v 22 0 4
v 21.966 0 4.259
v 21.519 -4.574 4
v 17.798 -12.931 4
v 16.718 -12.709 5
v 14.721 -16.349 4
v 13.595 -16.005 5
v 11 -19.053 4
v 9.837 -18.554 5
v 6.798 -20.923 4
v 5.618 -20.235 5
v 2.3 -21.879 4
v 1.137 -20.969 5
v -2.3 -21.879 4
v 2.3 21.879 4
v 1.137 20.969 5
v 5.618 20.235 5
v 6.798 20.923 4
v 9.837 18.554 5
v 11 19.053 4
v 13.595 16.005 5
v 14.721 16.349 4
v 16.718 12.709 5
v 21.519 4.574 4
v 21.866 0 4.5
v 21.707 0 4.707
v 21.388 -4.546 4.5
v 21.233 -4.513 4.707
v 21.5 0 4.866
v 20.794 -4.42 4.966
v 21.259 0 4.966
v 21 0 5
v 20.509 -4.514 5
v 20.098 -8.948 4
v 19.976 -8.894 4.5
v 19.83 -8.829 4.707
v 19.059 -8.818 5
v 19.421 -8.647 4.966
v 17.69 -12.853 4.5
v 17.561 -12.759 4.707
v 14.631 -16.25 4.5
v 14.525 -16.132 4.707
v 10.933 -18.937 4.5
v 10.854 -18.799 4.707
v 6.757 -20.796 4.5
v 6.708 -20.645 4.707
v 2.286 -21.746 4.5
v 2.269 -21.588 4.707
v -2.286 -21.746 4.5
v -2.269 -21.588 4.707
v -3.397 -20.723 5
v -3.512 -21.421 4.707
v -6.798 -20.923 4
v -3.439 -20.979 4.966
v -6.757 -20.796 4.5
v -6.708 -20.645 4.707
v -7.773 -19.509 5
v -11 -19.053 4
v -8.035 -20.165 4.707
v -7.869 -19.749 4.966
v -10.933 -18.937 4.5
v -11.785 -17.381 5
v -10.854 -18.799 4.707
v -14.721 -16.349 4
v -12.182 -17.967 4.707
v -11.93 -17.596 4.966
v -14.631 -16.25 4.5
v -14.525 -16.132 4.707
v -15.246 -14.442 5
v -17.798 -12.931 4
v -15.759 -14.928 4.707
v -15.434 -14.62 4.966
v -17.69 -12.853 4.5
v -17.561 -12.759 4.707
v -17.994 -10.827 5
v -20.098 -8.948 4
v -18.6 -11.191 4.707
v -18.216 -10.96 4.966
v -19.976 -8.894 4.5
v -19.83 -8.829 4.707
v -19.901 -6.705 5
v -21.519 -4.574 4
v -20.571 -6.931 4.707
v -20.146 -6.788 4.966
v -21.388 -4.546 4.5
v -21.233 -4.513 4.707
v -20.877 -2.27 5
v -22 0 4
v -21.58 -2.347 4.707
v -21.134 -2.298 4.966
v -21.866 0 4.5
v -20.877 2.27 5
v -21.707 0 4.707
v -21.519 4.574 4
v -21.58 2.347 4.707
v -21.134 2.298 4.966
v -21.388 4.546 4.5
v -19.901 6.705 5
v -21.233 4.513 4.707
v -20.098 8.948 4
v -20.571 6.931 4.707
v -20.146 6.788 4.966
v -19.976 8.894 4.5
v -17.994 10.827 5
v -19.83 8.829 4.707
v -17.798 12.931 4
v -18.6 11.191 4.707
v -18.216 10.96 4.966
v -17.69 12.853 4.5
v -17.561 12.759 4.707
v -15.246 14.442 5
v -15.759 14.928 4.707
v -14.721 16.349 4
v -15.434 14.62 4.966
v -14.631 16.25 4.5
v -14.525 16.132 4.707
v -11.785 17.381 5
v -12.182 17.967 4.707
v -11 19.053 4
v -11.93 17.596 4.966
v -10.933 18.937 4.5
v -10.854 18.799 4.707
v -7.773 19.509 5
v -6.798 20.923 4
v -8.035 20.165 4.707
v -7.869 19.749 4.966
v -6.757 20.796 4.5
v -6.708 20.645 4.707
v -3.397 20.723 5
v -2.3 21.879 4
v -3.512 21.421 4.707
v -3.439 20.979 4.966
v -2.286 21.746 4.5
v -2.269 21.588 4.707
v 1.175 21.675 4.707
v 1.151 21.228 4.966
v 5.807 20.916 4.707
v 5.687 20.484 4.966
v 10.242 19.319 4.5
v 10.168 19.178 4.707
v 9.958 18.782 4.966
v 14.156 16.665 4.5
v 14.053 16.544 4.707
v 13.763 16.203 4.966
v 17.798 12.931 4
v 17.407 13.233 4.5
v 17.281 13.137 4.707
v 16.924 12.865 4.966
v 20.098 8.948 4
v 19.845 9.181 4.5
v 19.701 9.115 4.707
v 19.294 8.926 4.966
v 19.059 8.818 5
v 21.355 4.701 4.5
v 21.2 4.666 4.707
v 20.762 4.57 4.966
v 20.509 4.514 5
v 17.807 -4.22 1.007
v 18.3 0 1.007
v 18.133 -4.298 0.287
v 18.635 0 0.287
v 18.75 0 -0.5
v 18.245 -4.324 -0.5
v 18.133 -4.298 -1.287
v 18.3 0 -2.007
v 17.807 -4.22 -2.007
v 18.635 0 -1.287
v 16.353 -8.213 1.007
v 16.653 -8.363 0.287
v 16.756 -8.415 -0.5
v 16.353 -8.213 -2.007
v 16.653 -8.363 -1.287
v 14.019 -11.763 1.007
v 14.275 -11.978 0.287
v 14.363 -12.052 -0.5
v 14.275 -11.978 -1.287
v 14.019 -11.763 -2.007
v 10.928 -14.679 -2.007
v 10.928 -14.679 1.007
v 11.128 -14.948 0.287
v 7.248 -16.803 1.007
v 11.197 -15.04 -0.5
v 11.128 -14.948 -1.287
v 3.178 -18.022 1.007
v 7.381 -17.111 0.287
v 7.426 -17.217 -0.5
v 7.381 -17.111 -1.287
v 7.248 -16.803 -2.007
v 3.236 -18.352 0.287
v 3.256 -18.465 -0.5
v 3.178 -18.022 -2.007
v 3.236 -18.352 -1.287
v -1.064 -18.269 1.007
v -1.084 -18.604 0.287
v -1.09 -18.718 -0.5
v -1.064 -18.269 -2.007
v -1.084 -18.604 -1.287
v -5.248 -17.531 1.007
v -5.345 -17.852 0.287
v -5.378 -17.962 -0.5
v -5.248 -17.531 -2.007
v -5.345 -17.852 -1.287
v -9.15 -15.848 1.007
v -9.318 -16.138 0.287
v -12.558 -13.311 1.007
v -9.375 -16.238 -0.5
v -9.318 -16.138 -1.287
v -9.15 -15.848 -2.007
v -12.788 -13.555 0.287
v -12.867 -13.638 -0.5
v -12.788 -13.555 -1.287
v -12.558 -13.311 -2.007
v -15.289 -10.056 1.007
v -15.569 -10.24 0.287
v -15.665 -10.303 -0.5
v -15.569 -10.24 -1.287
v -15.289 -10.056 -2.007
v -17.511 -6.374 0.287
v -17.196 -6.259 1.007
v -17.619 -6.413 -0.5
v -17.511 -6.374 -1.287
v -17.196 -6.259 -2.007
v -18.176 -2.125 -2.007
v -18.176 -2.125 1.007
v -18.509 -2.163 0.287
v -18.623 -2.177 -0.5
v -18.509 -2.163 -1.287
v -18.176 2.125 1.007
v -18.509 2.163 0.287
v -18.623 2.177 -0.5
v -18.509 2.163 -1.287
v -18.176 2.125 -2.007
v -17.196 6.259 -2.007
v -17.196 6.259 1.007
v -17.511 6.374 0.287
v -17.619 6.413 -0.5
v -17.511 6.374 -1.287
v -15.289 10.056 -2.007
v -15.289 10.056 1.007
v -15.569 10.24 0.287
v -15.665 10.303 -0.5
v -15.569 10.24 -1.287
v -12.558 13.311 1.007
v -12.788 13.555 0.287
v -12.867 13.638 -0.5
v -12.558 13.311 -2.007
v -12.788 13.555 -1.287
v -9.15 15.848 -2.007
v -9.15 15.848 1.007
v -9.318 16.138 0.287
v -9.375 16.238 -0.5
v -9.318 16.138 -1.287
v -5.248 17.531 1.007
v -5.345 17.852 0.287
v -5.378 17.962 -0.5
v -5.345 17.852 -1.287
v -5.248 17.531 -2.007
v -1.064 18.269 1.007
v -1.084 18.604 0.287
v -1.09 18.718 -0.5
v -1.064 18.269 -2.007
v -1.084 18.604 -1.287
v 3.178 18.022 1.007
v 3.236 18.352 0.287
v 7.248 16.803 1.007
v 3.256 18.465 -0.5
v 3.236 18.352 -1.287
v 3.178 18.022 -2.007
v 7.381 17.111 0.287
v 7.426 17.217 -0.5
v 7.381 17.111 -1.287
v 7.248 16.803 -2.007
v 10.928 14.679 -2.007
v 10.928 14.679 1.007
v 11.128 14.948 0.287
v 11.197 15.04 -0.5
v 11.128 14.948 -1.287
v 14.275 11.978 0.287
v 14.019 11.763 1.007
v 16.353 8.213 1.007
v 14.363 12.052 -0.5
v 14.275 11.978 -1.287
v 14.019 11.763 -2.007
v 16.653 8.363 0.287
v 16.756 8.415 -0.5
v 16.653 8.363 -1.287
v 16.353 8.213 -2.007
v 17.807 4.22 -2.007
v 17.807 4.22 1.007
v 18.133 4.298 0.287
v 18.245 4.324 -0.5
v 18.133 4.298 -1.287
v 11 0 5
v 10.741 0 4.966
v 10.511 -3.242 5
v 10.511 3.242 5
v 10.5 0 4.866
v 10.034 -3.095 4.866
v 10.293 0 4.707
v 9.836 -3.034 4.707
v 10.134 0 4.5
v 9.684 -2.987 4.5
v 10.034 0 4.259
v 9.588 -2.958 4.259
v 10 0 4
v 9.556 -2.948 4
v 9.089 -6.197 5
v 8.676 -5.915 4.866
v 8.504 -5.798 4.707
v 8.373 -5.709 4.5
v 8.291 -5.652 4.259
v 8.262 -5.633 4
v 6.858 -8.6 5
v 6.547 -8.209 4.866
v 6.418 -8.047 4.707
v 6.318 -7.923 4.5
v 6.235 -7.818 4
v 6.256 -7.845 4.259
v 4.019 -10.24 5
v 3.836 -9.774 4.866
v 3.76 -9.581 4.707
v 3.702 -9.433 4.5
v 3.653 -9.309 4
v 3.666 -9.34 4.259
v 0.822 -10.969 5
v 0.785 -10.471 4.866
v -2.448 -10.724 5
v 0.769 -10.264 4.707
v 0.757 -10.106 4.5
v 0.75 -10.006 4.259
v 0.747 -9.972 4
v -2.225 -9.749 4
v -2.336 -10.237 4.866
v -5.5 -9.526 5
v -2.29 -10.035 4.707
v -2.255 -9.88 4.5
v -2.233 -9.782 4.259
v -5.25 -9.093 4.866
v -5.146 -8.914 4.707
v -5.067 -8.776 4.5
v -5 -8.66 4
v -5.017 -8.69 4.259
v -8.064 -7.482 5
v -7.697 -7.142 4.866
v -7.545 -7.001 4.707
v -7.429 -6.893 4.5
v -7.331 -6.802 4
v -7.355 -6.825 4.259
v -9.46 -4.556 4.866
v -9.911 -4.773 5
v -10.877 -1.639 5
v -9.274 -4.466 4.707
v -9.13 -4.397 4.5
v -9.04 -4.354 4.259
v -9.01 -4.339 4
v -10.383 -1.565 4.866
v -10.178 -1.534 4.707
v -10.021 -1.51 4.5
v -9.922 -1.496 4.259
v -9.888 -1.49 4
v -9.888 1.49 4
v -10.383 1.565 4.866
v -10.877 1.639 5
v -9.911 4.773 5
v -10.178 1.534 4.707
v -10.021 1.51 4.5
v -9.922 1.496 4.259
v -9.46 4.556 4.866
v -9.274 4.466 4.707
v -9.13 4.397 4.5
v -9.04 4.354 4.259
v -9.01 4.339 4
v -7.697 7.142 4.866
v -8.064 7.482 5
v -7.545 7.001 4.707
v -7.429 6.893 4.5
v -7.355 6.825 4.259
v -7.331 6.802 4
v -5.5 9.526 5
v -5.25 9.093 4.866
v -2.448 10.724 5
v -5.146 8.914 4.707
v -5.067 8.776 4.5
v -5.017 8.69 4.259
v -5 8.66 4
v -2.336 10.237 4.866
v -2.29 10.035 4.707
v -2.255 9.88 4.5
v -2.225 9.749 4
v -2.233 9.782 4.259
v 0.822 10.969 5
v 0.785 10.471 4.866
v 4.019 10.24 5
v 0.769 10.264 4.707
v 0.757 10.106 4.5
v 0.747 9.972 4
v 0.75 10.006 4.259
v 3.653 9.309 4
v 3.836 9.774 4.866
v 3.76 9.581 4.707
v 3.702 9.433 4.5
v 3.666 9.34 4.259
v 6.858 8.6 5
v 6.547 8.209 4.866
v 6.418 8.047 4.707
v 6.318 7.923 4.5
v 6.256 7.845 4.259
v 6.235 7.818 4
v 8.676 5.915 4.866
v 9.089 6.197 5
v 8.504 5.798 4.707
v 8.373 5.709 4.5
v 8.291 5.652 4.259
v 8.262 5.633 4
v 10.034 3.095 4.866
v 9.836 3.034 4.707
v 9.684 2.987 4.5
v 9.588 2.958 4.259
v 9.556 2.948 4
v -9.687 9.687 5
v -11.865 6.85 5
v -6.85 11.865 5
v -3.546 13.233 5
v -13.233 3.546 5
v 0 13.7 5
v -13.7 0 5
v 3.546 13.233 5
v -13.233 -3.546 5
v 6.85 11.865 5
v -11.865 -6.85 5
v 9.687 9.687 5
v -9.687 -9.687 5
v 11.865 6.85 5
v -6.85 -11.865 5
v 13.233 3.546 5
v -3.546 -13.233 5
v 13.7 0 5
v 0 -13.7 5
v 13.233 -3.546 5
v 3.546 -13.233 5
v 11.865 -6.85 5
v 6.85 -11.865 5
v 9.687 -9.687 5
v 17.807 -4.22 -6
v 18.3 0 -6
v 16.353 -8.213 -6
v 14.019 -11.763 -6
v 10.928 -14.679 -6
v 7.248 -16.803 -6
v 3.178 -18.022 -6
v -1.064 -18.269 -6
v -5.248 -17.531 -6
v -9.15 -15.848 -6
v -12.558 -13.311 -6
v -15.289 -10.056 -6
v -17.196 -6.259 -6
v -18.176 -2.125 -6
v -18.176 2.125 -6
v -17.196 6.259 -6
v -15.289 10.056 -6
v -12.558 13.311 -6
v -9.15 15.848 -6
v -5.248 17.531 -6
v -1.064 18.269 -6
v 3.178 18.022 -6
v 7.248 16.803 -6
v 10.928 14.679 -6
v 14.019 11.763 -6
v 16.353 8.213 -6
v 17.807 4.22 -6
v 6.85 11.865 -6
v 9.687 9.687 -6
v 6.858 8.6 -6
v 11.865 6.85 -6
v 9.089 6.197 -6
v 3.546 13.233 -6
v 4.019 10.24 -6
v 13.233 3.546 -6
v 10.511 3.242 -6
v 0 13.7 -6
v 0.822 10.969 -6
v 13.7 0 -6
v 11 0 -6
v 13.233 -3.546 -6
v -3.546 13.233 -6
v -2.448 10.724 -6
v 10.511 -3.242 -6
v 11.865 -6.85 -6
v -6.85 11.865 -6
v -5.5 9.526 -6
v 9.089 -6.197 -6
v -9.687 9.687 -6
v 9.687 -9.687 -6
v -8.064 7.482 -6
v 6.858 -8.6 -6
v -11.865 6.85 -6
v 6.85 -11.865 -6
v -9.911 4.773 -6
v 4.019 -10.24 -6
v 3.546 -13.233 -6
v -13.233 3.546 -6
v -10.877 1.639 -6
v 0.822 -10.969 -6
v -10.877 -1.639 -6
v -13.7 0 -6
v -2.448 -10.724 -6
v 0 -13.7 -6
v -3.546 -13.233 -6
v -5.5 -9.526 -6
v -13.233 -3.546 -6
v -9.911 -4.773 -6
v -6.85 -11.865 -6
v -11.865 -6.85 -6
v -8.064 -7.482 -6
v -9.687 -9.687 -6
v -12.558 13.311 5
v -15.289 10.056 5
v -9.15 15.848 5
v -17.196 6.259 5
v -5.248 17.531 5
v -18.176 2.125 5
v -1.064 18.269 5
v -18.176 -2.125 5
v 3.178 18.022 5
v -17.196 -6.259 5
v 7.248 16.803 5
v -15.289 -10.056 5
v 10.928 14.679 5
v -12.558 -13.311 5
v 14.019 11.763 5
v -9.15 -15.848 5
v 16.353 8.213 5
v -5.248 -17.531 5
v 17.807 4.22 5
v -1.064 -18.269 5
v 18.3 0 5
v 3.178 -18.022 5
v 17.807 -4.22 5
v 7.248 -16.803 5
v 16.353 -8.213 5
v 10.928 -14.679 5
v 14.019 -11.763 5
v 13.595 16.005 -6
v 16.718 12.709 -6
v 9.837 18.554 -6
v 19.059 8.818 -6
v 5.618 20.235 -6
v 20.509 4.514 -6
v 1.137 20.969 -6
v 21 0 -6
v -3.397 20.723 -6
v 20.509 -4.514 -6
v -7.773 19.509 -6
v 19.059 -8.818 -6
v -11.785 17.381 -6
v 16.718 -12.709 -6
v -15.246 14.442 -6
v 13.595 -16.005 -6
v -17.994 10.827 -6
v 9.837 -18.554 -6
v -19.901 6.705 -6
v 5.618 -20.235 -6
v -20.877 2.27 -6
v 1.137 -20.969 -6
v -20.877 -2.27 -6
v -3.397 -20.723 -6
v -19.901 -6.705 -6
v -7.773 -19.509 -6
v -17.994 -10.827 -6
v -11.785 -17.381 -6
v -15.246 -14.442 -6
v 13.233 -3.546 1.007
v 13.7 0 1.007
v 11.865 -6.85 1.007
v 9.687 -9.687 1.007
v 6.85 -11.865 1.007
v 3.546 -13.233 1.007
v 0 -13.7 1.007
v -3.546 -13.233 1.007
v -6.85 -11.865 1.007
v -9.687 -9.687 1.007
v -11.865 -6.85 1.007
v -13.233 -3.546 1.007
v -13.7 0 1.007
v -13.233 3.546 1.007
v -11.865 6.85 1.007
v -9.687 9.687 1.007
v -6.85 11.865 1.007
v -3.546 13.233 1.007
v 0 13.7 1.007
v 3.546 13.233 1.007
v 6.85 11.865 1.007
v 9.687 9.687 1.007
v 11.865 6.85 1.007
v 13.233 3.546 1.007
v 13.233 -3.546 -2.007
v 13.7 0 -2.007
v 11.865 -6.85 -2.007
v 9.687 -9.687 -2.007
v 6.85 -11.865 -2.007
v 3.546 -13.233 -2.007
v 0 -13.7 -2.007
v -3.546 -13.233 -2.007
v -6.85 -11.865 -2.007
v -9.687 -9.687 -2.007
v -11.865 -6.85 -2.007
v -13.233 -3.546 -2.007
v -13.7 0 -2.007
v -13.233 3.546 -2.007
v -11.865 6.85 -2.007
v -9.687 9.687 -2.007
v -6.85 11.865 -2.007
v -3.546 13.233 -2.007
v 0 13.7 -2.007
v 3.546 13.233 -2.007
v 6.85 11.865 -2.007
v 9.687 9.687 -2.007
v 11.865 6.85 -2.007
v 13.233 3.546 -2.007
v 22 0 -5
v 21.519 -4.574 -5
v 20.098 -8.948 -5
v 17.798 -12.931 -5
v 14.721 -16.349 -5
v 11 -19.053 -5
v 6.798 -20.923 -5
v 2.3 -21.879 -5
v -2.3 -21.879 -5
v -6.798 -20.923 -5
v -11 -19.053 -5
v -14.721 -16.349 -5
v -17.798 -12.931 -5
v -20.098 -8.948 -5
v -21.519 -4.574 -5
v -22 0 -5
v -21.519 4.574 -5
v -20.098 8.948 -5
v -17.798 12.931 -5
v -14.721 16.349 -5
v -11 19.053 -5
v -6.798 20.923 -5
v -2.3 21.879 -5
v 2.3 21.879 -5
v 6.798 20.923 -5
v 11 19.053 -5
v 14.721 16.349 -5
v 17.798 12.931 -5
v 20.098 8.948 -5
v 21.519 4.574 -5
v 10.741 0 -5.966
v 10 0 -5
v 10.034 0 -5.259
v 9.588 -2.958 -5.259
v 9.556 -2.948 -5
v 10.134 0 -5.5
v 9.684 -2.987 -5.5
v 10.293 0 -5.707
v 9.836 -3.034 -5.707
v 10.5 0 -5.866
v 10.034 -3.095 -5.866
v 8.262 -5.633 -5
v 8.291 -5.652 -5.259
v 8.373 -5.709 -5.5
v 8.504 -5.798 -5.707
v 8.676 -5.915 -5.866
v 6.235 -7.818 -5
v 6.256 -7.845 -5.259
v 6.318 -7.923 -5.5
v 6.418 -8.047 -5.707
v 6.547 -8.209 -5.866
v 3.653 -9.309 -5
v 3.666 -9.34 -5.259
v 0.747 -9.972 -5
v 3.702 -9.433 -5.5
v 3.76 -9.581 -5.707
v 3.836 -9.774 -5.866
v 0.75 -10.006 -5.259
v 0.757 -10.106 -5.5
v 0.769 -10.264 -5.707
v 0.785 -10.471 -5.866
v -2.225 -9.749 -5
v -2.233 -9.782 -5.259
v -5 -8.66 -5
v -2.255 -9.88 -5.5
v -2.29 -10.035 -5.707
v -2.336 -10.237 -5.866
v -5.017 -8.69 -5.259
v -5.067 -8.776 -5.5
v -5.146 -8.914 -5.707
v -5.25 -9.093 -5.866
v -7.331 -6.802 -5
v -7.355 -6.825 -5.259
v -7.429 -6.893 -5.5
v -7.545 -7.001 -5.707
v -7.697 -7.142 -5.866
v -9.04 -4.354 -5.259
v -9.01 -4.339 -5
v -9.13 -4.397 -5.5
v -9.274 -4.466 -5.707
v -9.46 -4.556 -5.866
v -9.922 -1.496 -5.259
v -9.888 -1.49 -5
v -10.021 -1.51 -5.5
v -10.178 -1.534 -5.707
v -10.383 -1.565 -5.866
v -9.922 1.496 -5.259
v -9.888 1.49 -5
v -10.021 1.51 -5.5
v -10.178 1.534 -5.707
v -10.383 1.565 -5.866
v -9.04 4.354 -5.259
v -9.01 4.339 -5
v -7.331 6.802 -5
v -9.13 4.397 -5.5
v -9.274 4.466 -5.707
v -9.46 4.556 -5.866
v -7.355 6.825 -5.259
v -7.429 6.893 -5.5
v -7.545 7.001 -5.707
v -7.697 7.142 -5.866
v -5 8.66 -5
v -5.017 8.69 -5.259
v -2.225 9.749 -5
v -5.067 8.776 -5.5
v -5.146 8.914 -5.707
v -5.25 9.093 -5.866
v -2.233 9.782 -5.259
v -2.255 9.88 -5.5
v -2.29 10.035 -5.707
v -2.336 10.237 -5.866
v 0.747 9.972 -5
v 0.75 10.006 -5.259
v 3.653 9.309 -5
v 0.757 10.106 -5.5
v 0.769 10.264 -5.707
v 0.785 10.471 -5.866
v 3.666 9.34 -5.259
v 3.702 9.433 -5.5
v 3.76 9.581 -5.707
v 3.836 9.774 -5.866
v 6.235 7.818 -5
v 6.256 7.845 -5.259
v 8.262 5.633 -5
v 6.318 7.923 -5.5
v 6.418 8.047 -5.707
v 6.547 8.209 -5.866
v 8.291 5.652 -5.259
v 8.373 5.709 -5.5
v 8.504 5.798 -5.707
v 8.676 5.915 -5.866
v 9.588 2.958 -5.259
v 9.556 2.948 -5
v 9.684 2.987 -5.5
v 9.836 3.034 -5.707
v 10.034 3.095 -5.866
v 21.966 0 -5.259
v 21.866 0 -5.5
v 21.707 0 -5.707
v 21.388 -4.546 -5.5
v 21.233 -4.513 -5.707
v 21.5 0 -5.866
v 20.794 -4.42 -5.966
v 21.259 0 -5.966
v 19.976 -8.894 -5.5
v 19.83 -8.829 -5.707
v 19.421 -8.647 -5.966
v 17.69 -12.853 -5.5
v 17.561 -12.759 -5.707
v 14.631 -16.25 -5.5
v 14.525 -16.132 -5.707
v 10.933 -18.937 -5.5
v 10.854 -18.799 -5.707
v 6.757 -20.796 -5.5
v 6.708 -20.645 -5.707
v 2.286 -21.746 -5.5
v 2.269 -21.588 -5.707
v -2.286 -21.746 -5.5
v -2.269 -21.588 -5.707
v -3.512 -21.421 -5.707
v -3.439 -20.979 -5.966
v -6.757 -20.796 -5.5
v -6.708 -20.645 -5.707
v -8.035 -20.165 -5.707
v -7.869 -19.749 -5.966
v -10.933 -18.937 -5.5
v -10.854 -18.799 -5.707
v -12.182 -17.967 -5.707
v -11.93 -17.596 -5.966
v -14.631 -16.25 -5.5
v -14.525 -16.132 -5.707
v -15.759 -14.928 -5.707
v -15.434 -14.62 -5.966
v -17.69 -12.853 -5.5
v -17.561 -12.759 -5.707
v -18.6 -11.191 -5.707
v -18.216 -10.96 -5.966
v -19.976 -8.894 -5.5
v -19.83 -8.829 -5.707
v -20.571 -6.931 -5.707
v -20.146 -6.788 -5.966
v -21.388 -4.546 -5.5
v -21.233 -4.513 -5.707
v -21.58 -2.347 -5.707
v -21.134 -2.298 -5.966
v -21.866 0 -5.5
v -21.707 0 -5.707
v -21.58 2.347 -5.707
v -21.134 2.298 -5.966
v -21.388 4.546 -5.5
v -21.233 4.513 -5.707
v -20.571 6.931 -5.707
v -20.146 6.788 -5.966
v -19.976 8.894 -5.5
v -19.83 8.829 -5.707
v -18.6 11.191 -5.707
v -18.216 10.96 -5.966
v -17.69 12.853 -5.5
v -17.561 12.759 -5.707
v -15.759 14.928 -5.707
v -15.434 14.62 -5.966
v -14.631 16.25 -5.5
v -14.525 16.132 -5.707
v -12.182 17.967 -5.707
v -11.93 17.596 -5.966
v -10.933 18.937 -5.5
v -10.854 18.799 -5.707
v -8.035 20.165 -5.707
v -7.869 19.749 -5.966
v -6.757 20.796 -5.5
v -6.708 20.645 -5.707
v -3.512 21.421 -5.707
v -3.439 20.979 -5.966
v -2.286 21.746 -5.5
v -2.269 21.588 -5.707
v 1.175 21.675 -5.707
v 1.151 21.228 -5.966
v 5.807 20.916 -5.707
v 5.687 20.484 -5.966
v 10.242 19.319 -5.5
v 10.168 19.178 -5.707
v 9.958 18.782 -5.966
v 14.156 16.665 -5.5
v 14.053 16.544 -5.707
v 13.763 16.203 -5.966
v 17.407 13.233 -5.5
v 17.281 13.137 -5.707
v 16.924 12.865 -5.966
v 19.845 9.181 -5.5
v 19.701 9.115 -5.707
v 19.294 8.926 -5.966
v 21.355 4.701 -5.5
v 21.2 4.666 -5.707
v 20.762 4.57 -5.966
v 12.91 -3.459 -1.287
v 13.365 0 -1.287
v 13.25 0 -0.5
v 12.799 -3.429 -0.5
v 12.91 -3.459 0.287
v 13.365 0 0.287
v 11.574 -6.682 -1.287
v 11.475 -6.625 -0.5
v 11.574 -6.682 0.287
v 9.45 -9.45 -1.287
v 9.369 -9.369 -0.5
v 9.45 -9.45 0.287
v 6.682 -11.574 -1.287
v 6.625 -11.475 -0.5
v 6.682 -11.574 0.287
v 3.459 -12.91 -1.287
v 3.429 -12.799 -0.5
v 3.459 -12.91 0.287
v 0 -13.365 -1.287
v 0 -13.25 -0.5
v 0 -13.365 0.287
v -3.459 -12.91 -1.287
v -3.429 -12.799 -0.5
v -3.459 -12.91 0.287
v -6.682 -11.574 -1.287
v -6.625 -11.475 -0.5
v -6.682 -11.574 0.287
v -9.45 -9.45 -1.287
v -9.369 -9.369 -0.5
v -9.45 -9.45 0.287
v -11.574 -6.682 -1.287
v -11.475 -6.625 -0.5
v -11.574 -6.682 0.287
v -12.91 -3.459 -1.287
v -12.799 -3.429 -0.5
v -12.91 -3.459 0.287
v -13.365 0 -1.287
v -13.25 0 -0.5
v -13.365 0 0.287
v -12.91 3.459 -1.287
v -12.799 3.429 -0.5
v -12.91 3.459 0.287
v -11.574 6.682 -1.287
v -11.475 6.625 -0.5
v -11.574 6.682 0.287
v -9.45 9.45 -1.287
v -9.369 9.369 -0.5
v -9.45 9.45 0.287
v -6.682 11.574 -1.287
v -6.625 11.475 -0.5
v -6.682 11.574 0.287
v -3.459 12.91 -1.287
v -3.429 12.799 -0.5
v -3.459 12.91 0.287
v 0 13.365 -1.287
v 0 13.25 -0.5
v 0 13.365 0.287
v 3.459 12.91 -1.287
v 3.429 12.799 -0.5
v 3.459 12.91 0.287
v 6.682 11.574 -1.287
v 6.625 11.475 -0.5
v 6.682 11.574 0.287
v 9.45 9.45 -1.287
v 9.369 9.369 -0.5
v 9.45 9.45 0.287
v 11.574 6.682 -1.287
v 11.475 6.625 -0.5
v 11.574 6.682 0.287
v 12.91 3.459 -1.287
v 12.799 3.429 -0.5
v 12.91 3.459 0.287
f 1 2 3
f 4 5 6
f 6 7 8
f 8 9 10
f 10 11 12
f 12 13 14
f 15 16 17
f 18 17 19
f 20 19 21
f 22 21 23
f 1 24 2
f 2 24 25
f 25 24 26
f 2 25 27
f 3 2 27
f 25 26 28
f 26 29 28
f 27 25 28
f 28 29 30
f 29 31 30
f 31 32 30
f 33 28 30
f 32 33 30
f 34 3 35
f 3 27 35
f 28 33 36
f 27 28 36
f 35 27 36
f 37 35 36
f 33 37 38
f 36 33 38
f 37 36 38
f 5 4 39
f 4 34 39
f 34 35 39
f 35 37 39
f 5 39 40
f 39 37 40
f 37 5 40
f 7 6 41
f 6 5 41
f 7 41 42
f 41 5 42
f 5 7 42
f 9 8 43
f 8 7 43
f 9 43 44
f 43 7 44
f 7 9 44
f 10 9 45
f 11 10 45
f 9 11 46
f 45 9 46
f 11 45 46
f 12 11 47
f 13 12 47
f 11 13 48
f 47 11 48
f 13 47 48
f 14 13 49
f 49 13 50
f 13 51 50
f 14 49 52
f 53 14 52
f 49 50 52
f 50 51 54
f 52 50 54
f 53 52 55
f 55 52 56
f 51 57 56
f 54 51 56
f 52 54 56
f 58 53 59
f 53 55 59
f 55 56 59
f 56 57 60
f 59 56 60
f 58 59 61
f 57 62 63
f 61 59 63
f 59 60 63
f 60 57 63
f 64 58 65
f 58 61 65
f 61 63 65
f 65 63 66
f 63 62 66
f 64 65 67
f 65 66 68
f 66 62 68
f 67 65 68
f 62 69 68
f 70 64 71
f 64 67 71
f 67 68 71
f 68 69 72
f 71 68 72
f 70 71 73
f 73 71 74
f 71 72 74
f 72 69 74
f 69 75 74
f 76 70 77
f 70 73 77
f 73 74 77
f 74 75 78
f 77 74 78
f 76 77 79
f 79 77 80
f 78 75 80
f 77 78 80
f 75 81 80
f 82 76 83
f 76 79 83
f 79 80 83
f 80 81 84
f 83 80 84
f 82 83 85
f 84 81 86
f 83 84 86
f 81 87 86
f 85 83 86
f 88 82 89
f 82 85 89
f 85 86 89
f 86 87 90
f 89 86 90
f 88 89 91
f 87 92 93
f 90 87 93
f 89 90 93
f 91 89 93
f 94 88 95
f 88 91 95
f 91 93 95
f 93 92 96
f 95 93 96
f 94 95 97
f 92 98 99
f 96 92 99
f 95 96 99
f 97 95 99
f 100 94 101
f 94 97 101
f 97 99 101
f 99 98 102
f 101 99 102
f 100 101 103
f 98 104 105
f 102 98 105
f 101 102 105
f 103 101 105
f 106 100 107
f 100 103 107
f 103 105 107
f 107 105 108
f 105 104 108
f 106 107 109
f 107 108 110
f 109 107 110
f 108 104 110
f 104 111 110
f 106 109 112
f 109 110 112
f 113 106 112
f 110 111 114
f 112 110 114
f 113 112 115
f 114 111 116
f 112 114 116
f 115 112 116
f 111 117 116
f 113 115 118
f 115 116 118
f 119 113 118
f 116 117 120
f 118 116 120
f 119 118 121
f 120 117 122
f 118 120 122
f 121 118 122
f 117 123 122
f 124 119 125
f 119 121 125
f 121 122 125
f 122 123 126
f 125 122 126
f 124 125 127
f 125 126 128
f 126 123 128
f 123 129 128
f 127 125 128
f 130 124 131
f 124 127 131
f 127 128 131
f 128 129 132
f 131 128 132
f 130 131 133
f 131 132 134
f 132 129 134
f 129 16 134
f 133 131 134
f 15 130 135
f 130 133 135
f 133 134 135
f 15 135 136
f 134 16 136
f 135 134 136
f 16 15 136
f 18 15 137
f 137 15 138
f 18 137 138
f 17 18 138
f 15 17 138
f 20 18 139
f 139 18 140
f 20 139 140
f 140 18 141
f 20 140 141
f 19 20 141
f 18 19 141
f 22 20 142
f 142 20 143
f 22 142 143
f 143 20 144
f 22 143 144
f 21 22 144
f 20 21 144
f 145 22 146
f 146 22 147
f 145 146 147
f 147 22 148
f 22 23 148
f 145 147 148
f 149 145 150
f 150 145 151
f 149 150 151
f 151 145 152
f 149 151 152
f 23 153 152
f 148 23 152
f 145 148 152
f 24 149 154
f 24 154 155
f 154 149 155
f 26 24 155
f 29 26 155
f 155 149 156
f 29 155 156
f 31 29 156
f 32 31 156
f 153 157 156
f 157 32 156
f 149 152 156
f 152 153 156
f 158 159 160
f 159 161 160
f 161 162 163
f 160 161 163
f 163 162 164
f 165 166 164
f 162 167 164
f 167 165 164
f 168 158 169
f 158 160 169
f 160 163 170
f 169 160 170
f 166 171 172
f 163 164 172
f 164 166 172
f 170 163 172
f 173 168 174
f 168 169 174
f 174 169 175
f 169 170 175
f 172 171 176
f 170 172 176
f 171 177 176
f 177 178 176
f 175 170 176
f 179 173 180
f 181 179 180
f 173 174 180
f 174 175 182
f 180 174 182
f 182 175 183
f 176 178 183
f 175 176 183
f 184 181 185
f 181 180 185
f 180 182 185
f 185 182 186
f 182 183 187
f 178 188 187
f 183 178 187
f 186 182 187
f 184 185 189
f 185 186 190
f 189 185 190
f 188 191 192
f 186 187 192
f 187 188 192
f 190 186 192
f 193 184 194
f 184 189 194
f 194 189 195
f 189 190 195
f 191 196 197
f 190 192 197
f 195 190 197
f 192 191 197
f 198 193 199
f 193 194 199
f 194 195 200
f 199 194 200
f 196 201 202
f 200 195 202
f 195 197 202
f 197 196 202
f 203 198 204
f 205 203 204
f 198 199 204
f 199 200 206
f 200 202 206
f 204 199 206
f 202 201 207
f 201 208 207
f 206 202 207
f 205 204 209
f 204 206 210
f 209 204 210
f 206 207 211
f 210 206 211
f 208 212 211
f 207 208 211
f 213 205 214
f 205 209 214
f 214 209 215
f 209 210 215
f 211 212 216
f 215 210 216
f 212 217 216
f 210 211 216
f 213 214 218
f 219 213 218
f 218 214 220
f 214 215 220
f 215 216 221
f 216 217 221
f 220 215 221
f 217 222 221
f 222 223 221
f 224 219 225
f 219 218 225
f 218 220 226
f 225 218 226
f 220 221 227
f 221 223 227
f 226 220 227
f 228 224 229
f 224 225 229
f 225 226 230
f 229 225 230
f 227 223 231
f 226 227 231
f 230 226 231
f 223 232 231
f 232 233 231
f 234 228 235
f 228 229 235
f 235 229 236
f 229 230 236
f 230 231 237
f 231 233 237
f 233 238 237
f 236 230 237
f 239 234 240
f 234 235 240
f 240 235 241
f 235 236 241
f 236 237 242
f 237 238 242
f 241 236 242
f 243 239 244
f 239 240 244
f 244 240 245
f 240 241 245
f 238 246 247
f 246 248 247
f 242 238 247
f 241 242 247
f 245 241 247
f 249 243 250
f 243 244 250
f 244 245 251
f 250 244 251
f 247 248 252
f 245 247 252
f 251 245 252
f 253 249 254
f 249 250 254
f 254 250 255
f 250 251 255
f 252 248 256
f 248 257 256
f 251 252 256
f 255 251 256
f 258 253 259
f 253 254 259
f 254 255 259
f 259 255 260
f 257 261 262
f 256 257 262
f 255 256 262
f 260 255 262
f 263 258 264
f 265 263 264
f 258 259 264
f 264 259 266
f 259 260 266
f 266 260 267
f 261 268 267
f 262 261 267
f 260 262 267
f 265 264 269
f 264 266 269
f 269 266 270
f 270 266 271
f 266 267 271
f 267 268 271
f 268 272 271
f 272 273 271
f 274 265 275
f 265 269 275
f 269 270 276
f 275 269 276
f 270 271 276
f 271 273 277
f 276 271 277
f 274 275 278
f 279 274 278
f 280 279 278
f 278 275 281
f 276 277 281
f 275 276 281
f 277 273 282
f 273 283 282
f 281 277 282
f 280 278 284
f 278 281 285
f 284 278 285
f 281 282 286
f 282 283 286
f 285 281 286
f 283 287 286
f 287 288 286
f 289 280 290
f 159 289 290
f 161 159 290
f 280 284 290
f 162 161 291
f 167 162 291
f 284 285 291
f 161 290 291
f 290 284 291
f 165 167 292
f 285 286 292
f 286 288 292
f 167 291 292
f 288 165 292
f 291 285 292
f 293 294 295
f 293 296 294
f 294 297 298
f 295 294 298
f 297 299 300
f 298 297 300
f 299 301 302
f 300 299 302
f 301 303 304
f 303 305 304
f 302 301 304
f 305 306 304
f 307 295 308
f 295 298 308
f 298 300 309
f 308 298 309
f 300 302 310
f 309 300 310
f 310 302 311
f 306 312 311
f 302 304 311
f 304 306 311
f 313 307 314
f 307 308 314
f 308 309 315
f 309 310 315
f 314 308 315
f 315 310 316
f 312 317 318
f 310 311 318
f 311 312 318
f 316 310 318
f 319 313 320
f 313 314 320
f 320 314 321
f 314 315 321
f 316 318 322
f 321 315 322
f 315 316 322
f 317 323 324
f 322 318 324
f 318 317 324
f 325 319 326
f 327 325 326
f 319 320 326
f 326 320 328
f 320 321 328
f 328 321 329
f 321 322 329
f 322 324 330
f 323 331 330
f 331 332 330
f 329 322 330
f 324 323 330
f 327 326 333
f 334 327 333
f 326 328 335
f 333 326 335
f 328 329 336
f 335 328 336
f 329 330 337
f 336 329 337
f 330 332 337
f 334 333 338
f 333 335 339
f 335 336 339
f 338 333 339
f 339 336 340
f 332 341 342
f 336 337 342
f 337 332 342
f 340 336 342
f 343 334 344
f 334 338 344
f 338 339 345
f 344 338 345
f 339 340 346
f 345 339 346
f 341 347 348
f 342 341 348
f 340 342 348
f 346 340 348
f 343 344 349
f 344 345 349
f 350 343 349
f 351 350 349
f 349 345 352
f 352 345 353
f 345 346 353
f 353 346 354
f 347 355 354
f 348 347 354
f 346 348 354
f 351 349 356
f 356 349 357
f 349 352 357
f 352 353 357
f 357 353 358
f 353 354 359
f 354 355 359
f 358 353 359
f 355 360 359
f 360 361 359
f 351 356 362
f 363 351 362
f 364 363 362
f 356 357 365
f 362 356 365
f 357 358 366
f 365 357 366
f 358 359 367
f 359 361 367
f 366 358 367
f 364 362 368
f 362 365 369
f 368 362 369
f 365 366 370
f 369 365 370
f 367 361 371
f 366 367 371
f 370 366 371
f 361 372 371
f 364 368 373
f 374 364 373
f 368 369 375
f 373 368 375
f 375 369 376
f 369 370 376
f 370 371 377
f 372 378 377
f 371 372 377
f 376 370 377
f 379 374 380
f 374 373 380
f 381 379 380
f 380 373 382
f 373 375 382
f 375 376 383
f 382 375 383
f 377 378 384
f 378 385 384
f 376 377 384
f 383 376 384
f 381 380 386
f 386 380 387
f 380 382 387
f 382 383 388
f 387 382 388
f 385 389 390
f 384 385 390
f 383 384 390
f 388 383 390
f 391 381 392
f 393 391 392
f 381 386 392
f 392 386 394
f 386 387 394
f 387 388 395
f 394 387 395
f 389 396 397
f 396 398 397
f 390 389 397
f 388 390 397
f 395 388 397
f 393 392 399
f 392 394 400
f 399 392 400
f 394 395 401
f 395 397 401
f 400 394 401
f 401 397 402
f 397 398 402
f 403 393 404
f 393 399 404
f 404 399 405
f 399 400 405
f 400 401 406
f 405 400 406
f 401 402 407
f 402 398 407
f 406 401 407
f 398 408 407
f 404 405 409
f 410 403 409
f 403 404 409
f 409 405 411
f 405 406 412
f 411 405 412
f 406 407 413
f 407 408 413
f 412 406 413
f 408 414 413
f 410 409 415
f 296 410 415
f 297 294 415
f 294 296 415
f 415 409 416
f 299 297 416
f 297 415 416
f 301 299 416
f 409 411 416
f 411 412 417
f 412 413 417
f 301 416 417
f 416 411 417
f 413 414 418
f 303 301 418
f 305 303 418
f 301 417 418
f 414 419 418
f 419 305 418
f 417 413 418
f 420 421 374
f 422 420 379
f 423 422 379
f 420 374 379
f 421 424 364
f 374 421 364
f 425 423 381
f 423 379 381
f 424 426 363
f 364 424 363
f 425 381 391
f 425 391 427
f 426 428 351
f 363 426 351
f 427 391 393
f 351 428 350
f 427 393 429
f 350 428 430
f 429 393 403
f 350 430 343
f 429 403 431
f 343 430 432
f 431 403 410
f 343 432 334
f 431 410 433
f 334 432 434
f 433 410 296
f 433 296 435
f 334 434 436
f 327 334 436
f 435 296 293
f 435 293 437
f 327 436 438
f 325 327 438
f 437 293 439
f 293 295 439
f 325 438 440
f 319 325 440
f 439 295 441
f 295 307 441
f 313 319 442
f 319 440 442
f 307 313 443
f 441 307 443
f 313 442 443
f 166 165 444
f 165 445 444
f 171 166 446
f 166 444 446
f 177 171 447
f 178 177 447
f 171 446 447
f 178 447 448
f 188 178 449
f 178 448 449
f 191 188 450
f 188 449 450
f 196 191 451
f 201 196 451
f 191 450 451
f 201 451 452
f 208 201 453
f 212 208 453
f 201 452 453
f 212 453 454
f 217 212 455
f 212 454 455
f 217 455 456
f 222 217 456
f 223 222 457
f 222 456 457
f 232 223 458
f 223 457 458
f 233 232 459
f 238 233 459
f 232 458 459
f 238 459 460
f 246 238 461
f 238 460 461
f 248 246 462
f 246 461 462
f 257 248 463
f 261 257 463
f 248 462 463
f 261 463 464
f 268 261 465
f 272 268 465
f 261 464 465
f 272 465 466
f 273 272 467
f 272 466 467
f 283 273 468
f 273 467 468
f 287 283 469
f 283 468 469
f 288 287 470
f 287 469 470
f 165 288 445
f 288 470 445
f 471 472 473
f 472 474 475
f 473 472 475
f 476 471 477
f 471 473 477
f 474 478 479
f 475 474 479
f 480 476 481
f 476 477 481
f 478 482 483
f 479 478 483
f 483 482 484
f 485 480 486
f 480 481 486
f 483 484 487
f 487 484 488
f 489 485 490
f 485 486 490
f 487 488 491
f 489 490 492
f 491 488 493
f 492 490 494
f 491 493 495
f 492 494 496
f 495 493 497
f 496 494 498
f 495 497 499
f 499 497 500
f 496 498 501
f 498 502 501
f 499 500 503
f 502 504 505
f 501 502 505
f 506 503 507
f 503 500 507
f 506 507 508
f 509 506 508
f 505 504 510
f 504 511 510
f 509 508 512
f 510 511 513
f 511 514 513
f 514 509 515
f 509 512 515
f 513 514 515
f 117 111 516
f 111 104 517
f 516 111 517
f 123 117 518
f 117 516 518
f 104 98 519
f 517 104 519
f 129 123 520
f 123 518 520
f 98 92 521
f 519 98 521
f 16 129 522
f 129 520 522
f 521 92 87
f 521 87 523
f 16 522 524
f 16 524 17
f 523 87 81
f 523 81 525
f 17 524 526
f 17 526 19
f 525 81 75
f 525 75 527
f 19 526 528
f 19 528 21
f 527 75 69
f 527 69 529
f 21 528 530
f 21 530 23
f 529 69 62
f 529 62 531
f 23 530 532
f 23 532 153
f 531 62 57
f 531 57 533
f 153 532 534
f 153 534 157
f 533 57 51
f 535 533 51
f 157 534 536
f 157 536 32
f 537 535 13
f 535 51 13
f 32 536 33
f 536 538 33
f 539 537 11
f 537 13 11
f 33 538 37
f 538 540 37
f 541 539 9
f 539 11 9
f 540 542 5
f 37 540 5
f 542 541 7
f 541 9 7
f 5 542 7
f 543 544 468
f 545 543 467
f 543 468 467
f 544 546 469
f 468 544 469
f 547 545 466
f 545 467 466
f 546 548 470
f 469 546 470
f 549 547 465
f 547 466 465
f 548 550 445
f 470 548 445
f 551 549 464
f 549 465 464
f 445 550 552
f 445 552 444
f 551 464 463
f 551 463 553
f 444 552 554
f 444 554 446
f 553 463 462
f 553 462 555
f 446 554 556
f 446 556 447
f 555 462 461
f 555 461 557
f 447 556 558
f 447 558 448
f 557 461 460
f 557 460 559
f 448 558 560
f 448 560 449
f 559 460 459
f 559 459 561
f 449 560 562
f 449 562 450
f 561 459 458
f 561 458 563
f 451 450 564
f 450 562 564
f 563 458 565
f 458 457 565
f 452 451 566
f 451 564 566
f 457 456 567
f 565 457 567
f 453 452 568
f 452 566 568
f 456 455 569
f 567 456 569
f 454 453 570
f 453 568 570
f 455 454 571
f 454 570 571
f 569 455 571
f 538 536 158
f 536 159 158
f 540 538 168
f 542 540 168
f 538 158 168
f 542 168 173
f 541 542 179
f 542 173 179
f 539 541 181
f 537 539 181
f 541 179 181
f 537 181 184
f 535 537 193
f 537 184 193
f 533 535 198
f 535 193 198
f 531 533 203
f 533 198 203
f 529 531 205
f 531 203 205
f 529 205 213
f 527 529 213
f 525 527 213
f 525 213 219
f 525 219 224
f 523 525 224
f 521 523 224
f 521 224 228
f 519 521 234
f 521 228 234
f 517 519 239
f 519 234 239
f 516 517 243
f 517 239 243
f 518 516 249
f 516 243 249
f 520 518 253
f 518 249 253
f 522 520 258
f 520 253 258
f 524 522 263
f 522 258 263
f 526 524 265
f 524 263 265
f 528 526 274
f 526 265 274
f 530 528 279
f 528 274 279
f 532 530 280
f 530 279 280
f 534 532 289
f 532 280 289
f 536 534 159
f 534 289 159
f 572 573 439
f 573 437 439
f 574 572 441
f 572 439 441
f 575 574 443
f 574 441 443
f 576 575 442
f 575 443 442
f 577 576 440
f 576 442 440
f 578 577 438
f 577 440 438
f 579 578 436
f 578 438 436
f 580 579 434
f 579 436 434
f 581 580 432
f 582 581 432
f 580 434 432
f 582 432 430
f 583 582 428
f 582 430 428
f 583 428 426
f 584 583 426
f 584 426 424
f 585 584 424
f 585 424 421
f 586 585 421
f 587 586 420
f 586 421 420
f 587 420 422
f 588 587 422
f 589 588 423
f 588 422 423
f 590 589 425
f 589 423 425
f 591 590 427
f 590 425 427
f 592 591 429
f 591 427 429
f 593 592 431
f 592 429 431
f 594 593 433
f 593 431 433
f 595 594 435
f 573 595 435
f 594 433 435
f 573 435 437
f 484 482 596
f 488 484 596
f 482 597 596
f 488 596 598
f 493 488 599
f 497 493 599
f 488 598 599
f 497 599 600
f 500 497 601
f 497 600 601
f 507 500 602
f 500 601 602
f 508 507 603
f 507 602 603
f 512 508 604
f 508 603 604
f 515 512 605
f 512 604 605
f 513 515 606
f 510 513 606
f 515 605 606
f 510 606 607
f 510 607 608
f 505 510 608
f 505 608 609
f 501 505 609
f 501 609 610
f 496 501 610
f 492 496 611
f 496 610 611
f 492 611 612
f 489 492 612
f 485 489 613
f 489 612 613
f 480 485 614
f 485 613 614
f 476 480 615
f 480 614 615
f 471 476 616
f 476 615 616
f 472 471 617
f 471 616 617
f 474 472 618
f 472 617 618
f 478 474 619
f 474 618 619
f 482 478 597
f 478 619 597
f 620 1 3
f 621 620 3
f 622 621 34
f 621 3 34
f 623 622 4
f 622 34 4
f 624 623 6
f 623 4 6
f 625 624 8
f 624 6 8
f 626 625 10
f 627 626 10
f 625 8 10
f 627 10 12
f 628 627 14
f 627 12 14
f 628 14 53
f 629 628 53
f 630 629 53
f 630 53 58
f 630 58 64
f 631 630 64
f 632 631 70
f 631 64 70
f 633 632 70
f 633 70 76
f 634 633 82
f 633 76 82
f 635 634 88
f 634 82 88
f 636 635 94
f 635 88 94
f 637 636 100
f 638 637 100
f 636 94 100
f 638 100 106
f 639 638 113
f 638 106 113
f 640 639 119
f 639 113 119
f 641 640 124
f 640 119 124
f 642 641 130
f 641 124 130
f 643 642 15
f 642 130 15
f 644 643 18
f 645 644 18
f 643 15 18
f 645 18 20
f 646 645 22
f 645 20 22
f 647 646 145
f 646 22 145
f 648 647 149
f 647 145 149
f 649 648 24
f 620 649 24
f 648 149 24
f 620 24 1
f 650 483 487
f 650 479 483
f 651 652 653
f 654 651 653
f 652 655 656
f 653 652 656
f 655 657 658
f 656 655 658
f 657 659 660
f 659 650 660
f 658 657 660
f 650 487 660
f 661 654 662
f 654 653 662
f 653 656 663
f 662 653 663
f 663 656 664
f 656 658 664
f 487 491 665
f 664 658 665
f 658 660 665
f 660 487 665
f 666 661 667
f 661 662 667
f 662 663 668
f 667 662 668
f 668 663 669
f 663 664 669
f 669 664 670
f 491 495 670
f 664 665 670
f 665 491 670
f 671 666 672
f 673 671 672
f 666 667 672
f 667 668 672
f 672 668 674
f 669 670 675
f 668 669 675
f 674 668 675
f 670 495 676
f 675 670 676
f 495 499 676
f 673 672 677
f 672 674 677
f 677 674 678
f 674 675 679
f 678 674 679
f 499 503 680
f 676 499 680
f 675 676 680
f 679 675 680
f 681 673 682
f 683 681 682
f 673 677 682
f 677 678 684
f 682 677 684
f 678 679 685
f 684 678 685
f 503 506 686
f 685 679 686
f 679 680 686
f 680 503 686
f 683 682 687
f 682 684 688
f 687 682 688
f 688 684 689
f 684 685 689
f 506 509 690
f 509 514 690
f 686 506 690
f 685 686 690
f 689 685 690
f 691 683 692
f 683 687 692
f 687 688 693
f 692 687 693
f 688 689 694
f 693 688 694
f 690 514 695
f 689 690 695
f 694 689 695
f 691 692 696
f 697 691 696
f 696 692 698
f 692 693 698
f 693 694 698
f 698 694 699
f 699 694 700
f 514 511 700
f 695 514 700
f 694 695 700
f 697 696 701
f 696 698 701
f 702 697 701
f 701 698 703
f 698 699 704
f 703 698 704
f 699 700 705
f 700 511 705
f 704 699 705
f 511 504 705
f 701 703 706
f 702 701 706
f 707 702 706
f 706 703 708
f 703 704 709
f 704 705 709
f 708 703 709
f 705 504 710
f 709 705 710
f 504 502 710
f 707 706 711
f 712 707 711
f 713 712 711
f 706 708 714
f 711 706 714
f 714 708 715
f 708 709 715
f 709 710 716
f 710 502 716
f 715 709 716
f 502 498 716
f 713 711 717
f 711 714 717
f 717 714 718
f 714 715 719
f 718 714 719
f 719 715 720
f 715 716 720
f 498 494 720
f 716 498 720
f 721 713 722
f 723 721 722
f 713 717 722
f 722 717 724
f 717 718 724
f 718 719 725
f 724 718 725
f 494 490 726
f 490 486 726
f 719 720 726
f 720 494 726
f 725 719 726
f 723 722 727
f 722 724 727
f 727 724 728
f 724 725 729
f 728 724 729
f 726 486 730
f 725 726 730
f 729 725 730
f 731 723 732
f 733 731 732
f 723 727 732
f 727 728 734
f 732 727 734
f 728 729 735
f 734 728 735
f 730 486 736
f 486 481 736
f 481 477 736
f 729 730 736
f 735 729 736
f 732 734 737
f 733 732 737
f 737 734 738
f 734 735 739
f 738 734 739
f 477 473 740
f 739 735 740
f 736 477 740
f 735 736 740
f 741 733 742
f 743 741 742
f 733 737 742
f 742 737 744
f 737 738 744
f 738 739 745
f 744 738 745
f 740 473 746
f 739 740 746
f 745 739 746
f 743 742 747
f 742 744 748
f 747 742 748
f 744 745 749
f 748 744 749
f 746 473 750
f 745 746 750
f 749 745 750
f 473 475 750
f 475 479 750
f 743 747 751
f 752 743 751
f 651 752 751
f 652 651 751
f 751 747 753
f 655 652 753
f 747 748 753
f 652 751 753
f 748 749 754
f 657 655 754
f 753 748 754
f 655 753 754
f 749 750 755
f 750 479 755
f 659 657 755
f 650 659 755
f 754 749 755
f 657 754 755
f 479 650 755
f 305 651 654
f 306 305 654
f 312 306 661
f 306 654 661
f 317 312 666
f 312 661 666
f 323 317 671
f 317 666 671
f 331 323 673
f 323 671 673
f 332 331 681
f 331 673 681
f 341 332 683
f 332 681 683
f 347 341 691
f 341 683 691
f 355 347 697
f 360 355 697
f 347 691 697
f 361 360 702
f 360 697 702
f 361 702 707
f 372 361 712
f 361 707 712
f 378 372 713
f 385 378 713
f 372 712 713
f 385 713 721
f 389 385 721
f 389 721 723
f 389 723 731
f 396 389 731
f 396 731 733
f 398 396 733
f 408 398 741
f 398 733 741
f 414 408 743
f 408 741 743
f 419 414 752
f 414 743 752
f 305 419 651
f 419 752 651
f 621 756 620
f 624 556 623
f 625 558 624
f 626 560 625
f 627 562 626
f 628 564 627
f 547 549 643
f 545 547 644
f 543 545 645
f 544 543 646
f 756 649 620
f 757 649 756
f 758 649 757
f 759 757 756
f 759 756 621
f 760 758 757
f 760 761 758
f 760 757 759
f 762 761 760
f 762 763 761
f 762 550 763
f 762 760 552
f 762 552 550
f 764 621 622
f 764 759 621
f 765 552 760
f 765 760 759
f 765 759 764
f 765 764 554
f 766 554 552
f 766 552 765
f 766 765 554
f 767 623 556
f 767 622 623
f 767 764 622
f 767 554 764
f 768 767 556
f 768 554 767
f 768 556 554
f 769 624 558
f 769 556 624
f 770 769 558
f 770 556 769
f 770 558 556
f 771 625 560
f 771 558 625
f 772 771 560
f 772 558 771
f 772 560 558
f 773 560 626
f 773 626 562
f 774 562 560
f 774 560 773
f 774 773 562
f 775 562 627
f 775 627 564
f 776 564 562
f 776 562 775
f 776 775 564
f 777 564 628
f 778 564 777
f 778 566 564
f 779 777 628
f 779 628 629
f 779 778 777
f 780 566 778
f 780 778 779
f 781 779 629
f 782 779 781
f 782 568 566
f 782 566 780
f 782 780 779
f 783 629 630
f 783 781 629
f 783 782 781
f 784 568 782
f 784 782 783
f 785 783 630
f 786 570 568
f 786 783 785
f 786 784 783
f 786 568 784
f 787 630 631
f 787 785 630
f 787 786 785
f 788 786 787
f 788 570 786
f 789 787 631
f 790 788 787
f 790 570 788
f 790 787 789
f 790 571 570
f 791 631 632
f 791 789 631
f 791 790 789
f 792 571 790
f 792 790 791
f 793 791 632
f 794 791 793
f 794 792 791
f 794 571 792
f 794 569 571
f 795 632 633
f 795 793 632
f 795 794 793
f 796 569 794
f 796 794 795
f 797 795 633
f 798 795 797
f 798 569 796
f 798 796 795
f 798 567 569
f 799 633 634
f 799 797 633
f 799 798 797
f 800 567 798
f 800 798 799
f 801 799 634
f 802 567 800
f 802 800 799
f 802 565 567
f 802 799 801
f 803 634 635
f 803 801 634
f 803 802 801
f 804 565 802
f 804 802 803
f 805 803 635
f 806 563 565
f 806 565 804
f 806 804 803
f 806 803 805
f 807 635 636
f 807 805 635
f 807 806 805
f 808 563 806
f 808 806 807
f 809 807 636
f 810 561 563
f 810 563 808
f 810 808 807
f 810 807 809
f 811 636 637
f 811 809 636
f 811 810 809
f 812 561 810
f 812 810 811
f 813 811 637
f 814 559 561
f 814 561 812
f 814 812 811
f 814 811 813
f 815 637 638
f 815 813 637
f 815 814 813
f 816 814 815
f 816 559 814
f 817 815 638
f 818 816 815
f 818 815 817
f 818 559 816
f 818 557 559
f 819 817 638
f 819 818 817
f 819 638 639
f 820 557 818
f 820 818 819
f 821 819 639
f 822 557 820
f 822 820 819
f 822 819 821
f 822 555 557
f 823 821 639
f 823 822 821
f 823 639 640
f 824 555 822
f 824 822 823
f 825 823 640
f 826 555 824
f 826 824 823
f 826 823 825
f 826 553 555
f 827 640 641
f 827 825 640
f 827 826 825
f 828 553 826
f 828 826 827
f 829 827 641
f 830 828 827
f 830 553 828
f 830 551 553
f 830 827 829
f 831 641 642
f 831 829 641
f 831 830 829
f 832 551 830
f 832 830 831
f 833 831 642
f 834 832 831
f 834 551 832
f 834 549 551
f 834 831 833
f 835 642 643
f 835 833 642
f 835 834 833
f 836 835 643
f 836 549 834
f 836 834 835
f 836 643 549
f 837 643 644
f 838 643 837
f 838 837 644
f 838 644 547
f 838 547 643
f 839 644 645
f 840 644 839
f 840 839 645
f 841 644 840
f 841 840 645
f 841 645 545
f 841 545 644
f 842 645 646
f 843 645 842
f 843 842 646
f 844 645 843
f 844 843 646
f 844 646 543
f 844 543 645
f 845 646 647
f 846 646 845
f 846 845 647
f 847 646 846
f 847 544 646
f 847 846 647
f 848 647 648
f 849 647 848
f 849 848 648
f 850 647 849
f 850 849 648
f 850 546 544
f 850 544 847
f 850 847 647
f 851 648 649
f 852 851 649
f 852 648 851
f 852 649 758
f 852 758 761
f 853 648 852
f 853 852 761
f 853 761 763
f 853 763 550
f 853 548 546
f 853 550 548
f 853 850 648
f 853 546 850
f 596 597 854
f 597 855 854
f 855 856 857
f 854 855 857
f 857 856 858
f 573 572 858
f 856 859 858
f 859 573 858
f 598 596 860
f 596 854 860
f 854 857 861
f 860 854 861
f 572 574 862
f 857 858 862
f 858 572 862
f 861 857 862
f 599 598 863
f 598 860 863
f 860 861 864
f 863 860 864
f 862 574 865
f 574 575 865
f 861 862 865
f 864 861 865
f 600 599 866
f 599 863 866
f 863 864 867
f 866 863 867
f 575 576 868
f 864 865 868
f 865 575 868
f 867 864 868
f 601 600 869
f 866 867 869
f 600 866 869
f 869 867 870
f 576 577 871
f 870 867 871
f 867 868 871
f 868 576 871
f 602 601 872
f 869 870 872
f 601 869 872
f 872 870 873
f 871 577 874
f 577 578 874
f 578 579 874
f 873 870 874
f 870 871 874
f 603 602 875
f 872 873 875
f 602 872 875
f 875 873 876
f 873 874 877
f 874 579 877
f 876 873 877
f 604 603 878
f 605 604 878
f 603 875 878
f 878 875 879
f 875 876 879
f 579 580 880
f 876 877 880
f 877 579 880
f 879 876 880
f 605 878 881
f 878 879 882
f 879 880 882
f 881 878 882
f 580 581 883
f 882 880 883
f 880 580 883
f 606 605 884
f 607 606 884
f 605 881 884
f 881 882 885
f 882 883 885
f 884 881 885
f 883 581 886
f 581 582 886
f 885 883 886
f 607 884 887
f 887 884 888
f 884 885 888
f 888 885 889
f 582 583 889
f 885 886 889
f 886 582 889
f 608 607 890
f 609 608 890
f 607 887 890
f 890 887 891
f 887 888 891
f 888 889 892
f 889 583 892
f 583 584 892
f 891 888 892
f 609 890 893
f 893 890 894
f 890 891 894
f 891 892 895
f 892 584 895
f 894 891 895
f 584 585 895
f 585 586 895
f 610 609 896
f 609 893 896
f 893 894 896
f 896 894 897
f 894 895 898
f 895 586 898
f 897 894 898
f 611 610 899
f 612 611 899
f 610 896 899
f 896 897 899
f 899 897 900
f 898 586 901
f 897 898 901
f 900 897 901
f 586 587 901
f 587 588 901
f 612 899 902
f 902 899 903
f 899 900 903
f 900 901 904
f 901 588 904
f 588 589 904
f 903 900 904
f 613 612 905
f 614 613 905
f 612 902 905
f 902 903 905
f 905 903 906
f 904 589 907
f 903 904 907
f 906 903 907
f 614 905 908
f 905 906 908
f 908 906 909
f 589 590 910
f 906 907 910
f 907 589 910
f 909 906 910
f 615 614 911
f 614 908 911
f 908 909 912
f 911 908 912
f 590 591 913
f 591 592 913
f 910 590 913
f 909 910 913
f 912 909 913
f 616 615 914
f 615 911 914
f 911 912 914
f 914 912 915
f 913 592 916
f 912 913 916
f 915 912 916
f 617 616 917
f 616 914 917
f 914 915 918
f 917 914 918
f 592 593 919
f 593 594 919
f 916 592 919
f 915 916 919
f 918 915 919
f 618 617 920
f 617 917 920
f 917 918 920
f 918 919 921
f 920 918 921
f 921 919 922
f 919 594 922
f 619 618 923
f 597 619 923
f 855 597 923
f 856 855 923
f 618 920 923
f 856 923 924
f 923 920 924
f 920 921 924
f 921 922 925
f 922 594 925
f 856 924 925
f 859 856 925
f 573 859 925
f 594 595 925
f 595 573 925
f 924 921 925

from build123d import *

# Parameters (mm, degrees)
FILLET_1_R = 1
FILLET_2_R = 1


with BuildPart() as part:
    # 草图1 → 旋转1 (revolve)
    with BuildSketch(Plane(origin=(0, 0, 0), x_dir=(1, 0, 0), z_dir=(0, 1, 0))):
        with BuildLine():
            Line((13.7, 6), (13.7, 2.007481343))
            ThreePointArc((13.7, 2.007481343), (13.25, 0.5), (13.7, -1.007481343))
            Line((13.7, -1.007481343), (13.7, -5))
            Line((13.7, -5), (10, -5))
            Line((10, -5), (10, 6))
            Line((10, 6), (13.7, 6))
        make_face()
        with BuildLine():
            Line((22, 6), (22, -5))
            Line((22, -5), (18.3, -5))
            Line((18.3, -5), (18.3, -1.007481343))
            ThreePointArc((18.3, -1.007481343), (18.75, 0.5), (18.3, 2.007481343))
            Line((18.3, 2.007481343), (18.3, 6))
            Line((18.3, 6), (22, 6))
        make_face()
    revolve(axis=Axis((0, 0, 14.270204402), (0, 0, -1)))

    # 圆角1
    fillet_1_edges = [part.edges().sort_by_distance(p)[0] for p in [
        (-22, 0, -6),
        (-22, 0, 5),
    ]]
    fillet(fillet_1_edges, radius=FILLET_1_R)

    # 圆角2
    fillet_2_edges = [part.edges().sort_by_distance(p)[0] for p in [
        (-10, 0, -6),
        (-10, 0, 5),
    ]]
    fillet(fillet_2_edges, radius=FILLET_2_R)


solid = part.part
